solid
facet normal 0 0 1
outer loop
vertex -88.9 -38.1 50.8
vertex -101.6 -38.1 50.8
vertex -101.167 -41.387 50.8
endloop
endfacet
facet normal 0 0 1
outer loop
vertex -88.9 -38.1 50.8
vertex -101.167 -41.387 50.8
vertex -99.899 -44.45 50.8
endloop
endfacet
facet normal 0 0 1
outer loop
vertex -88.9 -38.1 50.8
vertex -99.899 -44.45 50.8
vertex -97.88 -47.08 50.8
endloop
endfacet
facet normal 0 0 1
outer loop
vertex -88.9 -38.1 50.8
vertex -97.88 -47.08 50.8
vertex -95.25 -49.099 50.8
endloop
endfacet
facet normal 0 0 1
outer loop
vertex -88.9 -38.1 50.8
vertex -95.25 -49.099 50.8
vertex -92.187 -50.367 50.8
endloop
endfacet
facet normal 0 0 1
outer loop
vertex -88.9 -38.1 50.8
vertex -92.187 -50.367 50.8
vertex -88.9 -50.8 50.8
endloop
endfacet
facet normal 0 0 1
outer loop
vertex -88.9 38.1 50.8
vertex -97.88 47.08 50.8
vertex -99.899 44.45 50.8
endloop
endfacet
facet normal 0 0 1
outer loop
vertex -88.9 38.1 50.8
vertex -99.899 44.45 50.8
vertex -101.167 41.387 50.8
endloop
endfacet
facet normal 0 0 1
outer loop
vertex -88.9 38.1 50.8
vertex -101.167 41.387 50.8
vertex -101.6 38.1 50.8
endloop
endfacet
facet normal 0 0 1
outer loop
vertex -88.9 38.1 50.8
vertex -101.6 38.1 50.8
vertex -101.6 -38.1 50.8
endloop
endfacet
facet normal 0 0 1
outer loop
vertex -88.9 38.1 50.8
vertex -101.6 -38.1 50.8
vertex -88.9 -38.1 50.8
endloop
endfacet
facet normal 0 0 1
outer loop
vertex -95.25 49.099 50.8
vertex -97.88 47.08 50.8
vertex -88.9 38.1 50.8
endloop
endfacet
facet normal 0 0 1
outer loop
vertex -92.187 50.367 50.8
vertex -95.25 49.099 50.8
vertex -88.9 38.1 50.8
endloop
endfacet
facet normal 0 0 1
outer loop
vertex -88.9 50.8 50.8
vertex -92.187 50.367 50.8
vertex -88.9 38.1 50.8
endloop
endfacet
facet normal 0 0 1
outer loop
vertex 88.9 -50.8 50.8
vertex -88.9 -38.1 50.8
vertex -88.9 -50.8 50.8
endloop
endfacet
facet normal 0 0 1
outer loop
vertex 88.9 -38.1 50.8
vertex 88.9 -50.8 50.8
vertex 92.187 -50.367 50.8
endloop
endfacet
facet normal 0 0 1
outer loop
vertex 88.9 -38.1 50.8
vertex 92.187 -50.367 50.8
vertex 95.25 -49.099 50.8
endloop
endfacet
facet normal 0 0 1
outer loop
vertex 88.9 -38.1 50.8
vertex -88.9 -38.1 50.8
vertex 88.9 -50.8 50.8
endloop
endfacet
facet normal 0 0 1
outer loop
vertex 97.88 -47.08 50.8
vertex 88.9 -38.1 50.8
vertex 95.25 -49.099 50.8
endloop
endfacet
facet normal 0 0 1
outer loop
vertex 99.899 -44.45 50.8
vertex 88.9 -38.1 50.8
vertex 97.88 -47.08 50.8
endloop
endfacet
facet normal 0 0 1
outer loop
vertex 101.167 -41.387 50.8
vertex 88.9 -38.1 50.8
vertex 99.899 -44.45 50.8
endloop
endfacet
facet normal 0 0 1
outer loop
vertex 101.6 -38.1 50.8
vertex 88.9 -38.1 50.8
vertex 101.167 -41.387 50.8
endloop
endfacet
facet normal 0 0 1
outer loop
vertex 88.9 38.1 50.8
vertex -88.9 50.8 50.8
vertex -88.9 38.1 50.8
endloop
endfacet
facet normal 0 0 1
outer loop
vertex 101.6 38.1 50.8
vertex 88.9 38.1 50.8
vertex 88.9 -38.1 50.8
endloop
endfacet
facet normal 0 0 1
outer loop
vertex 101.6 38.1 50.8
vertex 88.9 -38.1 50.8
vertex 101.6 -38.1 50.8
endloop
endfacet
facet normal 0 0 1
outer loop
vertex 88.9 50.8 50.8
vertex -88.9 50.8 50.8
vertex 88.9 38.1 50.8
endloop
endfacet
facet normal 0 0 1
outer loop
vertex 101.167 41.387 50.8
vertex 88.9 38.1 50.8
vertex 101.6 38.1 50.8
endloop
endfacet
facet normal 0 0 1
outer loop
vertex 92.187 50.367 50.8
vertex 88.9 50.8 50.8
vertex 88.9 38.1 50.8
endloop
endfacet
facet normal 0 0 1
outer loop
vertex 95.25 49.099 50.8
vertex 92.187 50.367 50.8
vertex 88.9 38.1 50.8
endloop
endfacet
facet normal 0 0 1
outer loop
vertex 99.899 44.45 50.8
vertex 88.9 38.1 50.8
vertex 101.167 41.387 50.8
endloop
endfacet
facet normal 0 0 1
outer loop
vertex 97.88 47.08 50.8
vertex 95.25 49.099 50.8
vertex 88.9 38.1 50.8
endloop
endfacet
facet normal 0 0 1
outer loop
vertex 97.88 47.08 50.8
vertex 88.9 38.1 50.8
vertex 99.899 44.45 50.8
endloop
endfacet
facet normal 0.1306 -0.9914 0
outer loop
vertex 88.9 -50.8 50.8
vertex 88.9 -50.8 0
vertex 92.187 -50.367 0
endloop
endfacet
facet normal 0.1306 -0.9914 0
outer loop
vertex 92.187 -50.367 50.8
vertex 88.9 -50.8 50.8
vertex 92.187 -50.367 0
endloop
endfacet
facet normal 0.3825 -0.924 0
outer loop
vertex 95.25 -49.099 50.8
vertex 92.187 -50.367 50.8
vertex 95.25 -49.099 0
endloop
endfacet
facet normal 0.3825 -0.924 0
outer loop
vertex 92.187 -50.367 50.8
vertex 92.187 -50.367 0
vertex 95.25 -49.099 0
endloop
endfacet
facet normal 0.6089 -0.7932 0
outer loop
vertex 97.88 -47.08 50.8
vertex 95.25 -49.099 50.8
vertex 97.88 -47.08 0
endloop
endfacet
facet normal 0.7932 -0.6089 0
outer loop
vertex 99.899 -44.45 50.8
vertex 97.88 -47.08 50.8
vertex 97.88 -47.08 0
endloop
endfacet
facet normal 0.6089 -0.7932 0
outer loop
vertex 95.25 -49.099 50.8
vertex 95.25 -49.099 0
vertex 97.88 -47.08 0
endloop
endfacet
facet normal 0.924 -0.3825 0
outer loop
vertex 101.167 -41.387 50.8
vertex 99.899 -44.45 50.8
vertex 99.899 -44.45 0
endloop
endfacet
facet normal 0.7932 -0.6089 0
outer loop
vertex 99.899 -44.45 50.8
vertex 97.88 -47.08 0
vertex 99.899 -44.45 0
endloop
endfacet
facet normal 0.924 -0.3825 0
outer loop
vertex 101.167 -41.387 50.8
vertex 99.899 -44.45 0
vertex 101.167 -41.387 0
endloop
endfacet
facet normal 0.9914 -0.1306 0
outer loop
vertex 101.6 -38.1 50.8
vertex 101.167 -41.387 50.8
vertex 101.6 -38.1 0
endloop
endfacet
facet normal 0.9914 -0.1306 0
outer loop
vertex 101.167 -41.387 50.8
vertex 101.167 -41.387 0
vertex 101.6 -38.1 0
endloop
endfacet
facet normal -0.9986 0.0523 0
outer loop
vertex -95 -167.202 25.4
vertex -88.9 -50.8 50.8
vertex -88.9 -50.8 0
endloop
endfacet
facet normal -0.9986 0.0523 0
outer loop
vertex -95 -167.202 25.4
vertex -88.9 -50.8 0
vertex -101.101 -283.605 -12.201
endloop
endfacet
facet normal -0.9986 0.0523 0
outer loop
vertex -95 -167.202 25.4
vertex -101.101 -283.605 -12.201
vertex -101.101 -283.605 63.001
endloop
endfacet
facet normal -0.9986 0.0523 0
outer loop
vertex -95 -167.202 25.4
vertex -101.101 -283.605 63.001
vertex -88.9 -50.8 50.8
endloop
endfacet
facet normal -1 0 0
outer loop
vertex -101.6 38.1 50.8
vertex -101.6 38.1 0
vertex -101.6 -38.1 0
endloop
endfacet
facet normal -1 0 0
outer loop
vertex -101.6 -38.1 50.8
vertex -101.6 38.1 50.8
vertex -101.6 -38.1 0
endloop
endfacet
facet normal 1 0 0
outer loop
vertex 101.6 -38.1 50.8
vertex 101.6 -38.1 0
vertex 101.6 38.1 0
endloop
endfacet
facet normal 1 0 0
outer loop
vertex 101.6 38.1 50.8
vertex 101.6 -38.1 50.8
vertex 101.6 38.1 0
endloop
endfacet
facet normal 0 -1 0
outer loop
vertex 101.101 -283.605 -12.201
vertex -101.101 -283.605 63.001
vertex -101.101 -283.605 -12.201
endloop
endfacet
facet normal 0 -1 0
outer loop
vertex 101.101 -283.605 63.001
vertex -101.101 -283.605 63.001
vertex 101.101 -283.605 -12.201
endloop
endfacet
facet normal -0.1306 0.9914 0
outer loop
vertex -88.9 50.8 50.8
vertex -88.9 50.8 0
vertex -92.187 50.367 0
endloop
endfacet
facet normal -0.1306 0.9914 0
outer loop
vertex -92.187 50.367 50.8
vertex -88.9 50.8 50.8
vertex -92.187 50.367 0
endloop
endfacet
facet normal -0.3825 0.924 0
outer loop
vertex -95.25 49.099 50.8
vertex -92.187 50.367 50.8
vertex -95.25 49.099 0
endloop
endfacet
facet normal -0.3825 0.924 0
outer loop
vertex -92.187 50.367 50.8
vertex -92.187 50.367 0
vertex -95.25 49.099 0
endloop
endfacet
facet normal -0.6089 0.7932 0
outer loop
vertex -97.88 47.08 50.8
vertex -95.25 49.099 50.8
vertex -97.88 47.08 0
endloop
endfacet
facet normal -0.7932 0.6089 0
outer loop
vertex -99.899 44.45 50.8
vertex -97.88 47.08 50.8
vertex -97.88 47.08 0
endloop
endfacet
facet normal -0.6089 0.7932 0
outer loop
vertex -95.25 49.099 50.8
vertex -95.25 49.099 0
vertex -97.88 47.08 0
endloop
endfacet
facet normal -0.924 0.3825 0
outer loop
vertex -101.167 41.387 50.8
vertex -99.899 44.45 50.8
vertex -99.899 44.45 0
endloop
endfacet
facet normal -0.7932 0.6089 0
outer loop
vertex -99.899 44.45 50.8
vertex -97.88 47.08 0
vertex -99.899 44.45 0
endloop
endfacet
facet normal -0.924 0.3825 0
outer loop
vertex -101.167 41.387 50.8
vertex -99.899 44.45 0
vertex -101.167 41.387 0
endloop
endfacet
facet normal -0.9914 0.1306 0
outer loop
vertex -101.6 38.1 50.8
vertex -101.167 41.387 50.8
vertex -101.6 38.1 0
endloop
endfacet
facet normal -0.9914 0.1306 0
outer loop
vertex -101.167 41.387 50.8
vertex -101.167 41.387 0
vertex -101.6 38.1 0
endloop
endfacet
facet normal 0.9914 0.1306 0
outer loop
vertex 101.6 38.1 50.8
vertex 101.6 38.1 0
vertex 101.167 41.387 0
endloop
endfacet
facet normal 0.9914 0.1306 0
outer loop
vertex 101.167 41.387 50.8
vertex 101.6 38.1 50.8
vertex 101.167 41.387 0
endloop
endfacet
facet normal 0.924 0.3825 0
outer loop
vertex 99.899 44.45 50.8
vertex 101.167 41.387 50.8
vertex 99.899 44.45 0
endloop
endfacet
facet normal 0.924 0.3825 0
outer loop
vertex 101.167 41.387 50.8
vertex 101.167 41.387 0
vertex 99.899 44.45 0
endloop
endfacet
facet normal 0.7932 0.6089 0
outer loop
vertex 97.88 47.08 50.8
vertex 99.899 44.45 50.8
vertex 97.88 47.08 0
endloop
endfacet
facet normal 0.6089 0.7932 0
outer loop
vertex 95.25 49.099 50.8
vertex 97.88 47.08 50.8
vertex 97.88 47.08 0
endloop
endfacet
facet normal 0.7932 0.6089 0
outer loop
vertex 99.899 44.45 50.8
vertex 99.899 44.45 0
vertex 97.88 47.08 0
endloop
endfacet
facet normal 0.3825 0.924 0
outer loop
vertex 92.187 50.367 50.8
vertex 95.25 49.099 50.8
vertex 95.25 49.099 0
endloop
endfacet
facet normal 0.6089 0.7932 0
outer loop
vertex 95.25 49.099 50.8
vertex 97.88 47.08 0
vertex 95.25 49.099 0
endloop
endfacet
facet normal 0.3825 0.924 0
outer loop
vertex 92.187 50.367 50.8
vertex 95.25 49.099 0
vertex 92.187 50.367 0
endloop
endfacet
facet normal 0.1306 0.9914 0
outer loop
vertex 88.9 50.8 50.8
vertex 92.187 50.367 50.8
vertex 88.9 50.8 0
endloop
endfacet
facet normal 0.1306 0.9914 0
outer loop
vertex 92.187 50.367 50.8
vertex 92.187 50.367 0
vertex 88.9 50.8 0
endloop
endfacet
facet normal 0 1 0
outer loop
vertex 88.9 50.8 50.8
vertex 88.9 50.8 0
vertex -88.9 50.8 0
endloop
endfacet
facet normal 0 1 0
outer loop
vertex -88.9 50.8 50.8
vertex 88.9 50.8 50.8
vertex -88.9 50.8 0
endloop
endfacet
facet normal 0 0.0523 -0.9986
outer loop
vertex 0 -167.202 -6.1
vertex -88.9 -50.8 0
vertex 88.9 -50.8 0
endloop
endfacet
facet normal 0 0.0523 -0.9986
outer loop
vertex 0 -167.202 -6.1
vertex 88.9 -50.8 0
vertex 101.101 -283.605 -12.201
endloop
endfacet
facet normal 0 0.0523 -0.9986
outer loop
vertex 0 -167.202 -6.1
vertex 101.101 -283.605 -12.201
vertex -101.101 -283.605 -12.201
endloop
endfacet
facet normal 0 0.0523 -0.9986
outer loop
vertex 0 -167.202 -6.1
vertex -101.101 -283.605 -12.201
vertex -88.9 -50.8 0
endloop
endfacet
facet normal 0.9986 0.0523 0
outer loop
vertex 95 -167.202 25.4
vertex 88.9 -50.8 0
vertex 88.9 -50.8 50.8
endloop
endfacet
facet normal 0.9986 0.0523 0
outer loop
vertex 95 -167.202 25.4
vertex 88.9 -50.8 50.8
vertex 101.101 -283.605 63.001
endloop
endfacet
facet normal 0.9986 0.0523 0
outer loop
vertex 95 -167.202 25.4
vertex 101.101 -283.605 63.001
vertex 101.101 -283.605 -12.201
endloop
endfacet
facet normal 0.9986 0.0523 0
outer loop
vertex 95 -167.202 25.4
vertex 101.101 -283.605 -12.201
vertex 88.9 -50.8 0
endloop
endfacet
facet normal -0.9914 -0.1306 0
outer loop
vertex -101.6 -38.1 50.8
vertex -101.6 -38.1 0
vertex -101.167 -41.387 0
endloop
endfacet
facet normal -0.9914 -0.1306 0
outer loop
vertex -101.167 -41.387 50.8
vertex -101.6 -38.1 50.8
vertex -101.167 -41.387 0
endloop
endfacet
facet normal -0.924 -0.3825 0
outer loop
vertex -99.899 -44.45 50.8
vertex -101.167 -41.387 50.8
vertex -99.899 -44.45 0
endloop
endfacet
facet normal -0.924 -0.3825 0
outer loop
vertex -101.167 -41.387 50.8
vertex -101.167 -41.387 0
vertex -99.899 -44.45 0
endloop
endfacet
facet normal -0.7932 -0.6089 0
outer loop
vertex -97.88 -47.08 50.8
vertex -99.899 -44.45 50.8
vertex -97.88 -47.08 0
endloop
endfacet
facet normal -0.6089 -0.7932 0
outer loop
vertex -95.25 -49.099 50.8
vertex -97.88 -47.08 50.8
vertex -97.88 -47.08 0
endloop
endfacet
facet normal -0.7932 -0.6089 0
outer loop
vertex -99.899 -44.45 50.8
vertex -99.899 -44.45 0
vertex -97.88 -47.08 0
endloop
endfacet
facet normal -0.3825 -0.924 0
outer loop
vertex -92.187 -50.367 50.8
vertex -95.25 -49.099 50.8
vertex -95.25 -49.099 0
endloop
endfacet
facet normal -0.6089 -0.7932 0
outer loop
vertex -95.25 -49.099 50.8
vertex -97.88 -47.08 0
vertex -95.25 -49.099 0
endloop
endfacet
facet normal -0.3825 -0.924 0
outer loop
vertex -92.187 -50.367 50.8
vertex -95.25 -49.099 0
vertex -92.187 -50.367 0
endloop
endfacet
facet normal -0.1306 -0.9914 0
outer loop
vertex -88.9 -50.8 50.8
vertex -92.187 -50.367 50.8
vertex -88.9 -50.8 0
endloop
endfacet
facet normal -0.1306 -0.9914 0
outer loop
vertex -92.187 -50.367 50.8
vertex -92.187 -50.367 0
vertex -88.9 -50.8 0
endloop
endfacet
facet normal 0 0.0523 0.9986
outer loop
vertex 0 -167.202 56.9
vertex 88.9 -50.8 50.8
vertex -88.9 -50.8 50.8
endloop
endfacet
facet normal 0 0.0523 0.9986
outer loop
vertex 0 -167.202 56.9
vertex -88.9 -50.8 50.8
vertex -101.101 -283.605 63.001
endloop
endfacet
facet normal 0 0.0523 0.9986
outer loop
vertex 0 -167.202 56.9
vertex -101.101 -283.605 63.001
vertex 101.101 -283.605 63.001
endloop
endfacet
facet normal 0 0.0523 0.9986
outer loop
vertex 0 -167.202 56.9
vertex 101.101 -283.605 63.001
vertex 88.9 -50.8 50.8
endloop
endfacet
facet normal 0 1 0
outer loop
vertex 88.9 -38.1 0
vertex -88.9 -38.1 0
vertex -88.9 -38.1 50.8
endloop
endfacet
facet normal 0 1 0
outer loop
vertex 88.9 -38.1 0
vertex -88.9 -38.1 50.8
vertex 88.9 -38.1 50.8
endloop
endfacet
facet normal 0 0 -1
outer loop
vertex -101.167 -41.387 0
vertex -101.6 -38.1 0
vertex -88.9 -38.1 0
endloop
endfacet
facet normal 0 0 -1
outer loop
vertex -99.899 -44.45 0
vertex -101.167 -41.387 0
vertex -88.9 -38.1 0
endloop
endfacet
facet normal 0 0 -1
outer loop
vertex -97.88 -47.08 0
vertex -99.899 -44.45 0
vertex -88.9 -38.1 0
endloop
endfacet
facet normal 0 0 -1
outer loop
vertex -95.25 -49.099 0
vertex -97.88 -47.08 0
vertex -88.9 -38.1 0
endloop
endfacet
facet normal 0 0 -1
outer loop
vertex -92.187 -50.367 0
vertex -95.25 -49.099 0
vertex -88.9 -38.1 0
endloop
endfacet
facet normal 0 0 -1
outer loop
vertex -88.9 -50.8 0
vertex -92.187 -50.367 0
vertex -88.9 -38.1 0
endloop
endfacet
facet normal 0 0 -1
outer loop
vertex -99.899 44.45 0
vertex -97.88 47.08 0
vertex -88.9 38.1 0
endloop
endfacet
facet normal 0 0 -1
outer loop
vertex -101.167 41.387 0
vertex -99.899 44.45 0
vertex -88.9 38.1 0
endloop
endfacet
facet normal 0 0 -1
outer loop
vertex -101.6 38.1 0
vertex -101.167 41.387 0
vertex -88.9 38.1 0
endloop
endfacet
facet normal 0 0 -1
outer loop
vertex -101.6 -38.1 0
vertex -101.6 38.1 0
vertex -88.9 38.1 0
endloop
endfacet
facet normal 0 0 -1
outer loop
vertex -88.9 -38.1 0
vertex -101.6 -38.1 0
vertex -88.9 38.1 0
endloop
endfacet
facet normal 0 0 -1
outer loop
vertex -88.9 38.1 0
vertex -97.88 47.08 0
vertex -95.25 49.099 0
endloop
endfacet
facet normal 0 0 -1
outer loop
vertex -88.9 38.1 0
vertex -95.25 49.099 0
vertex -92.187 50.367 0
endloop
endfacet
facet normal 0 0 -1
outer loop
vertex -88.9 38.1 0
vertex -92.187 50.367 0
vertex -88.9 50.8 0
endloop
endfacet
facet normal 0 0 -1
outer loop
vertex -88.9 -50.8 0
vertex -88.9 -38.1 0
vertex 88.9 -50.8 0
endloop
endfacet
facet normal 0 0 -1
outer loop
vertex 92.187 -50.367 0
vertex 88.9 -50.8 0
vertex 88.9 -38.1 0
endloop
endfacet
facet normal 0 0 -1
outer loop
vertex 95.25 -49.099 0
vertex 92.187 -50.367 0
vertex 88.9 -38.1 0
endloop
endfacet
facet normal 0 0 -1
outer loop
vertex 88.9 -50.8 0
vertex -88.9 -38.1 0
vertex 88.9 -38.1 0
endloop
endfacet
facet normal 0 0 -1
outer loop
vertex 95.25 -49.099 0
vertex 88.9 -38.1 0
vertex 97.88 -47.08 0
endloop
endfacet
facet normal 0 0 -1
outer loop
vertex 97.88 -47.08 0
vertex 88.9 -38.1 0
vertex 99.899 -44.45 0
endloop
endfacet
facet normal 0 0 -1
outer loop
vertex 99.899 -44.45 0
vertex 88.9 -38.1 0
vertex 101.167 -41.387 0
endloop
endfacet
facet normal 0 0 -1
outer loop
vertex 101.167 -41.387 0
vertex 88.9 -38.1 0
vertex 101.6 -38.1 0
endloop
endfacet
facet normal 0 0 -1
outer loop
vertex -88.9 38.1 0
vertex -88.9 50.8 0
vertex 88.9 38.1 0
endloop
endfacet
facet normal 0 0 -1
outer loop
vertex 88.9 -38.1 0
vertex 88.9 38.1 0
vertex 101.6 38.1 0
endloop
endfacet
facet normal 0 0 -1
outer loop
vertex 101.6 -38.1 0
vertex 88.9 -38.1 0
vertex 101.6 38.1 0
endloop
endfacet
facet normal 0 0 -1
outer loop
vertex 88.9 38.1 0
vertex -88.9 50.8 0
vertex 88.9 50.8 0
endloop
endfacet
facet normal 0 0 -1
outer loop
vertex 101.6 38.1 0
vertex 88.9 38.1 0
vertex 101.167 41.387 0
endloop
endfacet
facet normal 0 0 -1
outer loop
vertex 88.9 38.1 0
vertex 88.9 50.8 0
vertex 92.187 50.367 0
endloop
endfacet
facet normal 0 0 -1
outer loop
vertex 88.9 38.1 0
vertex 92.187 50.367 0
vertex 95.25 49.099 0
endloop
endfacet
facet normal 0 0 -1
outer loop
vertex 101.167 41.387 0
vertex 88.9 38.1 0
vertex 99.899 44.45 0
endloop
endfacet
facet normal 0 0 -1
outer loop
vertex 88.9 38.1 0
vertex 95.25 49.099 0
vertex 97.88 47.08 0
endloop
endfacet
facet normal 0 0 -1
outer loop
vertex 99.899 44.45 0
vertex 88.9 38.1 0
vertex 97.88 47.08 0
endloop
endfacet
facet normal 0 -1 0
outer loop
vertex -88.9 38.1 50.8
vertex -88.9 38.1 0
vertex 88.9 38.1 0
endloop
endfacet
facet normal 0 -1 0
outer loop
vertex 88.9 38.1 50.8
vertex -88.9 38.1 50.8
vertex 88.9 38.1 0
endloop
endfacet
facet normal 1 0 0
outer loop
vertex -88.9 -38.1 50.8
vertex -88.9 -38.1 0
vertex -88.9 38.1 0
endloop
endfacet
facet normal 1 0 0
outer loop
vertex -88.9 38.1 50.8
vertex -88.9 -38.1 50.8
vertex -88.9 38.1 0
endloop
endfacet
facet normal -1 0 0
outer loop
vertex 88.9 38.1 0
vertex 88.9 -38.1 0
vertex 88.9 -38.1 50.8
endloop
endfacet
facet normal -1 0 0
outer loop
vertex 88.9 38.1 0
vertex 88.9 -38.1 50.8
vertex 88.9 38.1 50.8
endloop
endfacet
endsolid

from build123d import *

# Parameters (mm, degrees)
F0_W     = 177.8
F0_H     = 76.2
F1_DEPTH = 50.8
F2_W     = 177.8
F2_H     = 50.8
F3_DEPTH = 232.8048453
F3_TAPER = -3


# Not quite as in the source:
# - an extrude ends at something that could not be found from the text; its depth is read off the source's solid


with BuildPart() as f1:
    # F0 (on Top) → F1 (new body)
    with BuildSketch(Plane.XY):
        with BuildLine():
            ThreePointArc((101.6, 38.1), (97.8802561211, 47.0802561211), (88.9, 50.8))
            Line((88.9, 50.8), (-88.9, 50.8))
            ThreePointArc((-88.9, 50.8), (-97.8802561211, 47.0802561211), (-101.6, 38.1))
            Line((-101.6, 38.1), (-101.6, -38.1))
            ThreePointArc((-101.6, -38.1), (-97.8802561211, -47.0802561211), (-88.9, -50.8))
            Line((-88.9, -50.8), (88.9, -50.8))
            ThreePointArc((88.9, -50.8), (97.8802561211, -47.0802561211), (101.6, -38.1))
            Line((101.6, -38.1), (101.6, 38.1))
        make_face()
        Rectangle(F0_W, F0_H, mode=Mode.SUBTRACT)
    extrude(amount=F1_DEPTH)

    # F2 (on face) → F3 (join, through all)
    with BuildSketch(Plane.XZ.offset(50.8)):
        with Locations((0, 25.4)):
            Rectangle(F2_W, F2_H)
    extrude(amount=F3_DEPTH, taper=F3_TAPER)


solid = f1.part
